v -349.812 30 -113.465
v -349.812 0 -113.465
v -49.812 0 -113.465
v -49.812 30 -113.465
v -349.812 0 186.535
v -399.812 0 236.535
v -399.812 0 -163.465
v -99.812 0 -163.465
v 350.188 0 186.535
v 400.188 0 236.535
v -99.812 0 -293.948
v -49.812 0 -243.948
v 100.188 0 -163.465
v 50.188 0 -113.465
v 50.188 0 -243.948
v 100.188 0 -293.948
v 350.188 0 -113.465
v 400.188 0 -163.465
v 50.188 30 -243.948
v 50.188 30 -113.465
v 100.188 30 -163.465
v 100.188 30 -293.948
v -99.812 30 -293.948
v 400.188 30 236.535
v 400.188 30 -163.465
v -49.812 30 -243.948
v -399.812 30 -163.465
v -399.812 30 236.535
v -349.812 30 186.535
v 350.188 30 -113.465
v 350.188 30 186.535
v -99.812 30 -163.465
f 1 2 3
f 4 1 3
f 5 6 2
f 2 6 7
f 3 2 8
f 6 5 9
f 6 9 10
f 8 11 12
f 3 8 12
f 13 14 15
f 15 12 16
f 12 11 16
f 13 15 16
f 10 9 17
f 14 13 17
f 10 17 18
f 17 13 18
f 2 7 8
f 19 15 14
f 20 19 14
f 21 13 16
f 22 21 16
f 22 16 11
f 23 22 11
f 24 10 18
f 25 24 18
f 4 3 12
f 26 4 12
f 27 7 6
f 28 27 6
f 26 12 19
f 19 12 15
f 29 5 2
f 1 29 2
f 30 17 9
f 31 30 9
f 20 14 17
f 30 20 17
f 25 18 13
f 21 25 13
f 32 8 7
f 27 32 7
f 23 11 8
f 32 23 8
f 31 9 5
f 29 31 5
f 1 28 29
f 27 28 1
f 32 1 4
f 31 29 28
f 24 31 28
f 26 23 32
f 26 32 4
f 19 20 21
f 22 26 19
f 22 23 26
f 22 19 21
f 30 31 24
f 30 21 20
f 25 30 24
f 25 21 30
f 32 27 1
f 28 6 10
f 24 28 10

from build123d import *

# Parameters (mm, degrees)
BOSS_EXTRUDE4_DEPTH = 30


with BuildPart() as part:
    # Sketch1 → Boss-Extrude4 (new body)
    with BuildSketch(Plane(origin=(0, 0, 0), x_dir=(1, 0, 0), z_dir=(0, 1, 0))):
        Polygon((-99.811676083, 163.465160075), (-399.811676083, 163.465160075), (-399.811676083, -236.534839925), (400.188323917, -236.534839925), (400.188323917, 163.465160075), (100.188323917, 163.465160075), (50.188323917, 163.465160075), (50.188323917, 113.465160075), (350.188323917, 113.465160075), (350.188323917, -186.534839925), (-349.811676083, -186.534839925), (-349.811676083, 113.465160075), (-49.811676083, 113.465160075), (-49.811676083, 163.465160075), align=None)
        Polygon((-99.811676083, 293.948122897), (-99.811676083, 163.465160075), (-49.811676083, 163.465160075), (-49.811676083, 243.948122897), (50.188323917, 243.948122897), (50.188323917, 163.465160075), (100.188323917, 163.465160075), (100.188323917, 293.948122897), align=None)
    extrude(amount=BOSS_EXTRUDE4_DEPTH)


solid = part.part
